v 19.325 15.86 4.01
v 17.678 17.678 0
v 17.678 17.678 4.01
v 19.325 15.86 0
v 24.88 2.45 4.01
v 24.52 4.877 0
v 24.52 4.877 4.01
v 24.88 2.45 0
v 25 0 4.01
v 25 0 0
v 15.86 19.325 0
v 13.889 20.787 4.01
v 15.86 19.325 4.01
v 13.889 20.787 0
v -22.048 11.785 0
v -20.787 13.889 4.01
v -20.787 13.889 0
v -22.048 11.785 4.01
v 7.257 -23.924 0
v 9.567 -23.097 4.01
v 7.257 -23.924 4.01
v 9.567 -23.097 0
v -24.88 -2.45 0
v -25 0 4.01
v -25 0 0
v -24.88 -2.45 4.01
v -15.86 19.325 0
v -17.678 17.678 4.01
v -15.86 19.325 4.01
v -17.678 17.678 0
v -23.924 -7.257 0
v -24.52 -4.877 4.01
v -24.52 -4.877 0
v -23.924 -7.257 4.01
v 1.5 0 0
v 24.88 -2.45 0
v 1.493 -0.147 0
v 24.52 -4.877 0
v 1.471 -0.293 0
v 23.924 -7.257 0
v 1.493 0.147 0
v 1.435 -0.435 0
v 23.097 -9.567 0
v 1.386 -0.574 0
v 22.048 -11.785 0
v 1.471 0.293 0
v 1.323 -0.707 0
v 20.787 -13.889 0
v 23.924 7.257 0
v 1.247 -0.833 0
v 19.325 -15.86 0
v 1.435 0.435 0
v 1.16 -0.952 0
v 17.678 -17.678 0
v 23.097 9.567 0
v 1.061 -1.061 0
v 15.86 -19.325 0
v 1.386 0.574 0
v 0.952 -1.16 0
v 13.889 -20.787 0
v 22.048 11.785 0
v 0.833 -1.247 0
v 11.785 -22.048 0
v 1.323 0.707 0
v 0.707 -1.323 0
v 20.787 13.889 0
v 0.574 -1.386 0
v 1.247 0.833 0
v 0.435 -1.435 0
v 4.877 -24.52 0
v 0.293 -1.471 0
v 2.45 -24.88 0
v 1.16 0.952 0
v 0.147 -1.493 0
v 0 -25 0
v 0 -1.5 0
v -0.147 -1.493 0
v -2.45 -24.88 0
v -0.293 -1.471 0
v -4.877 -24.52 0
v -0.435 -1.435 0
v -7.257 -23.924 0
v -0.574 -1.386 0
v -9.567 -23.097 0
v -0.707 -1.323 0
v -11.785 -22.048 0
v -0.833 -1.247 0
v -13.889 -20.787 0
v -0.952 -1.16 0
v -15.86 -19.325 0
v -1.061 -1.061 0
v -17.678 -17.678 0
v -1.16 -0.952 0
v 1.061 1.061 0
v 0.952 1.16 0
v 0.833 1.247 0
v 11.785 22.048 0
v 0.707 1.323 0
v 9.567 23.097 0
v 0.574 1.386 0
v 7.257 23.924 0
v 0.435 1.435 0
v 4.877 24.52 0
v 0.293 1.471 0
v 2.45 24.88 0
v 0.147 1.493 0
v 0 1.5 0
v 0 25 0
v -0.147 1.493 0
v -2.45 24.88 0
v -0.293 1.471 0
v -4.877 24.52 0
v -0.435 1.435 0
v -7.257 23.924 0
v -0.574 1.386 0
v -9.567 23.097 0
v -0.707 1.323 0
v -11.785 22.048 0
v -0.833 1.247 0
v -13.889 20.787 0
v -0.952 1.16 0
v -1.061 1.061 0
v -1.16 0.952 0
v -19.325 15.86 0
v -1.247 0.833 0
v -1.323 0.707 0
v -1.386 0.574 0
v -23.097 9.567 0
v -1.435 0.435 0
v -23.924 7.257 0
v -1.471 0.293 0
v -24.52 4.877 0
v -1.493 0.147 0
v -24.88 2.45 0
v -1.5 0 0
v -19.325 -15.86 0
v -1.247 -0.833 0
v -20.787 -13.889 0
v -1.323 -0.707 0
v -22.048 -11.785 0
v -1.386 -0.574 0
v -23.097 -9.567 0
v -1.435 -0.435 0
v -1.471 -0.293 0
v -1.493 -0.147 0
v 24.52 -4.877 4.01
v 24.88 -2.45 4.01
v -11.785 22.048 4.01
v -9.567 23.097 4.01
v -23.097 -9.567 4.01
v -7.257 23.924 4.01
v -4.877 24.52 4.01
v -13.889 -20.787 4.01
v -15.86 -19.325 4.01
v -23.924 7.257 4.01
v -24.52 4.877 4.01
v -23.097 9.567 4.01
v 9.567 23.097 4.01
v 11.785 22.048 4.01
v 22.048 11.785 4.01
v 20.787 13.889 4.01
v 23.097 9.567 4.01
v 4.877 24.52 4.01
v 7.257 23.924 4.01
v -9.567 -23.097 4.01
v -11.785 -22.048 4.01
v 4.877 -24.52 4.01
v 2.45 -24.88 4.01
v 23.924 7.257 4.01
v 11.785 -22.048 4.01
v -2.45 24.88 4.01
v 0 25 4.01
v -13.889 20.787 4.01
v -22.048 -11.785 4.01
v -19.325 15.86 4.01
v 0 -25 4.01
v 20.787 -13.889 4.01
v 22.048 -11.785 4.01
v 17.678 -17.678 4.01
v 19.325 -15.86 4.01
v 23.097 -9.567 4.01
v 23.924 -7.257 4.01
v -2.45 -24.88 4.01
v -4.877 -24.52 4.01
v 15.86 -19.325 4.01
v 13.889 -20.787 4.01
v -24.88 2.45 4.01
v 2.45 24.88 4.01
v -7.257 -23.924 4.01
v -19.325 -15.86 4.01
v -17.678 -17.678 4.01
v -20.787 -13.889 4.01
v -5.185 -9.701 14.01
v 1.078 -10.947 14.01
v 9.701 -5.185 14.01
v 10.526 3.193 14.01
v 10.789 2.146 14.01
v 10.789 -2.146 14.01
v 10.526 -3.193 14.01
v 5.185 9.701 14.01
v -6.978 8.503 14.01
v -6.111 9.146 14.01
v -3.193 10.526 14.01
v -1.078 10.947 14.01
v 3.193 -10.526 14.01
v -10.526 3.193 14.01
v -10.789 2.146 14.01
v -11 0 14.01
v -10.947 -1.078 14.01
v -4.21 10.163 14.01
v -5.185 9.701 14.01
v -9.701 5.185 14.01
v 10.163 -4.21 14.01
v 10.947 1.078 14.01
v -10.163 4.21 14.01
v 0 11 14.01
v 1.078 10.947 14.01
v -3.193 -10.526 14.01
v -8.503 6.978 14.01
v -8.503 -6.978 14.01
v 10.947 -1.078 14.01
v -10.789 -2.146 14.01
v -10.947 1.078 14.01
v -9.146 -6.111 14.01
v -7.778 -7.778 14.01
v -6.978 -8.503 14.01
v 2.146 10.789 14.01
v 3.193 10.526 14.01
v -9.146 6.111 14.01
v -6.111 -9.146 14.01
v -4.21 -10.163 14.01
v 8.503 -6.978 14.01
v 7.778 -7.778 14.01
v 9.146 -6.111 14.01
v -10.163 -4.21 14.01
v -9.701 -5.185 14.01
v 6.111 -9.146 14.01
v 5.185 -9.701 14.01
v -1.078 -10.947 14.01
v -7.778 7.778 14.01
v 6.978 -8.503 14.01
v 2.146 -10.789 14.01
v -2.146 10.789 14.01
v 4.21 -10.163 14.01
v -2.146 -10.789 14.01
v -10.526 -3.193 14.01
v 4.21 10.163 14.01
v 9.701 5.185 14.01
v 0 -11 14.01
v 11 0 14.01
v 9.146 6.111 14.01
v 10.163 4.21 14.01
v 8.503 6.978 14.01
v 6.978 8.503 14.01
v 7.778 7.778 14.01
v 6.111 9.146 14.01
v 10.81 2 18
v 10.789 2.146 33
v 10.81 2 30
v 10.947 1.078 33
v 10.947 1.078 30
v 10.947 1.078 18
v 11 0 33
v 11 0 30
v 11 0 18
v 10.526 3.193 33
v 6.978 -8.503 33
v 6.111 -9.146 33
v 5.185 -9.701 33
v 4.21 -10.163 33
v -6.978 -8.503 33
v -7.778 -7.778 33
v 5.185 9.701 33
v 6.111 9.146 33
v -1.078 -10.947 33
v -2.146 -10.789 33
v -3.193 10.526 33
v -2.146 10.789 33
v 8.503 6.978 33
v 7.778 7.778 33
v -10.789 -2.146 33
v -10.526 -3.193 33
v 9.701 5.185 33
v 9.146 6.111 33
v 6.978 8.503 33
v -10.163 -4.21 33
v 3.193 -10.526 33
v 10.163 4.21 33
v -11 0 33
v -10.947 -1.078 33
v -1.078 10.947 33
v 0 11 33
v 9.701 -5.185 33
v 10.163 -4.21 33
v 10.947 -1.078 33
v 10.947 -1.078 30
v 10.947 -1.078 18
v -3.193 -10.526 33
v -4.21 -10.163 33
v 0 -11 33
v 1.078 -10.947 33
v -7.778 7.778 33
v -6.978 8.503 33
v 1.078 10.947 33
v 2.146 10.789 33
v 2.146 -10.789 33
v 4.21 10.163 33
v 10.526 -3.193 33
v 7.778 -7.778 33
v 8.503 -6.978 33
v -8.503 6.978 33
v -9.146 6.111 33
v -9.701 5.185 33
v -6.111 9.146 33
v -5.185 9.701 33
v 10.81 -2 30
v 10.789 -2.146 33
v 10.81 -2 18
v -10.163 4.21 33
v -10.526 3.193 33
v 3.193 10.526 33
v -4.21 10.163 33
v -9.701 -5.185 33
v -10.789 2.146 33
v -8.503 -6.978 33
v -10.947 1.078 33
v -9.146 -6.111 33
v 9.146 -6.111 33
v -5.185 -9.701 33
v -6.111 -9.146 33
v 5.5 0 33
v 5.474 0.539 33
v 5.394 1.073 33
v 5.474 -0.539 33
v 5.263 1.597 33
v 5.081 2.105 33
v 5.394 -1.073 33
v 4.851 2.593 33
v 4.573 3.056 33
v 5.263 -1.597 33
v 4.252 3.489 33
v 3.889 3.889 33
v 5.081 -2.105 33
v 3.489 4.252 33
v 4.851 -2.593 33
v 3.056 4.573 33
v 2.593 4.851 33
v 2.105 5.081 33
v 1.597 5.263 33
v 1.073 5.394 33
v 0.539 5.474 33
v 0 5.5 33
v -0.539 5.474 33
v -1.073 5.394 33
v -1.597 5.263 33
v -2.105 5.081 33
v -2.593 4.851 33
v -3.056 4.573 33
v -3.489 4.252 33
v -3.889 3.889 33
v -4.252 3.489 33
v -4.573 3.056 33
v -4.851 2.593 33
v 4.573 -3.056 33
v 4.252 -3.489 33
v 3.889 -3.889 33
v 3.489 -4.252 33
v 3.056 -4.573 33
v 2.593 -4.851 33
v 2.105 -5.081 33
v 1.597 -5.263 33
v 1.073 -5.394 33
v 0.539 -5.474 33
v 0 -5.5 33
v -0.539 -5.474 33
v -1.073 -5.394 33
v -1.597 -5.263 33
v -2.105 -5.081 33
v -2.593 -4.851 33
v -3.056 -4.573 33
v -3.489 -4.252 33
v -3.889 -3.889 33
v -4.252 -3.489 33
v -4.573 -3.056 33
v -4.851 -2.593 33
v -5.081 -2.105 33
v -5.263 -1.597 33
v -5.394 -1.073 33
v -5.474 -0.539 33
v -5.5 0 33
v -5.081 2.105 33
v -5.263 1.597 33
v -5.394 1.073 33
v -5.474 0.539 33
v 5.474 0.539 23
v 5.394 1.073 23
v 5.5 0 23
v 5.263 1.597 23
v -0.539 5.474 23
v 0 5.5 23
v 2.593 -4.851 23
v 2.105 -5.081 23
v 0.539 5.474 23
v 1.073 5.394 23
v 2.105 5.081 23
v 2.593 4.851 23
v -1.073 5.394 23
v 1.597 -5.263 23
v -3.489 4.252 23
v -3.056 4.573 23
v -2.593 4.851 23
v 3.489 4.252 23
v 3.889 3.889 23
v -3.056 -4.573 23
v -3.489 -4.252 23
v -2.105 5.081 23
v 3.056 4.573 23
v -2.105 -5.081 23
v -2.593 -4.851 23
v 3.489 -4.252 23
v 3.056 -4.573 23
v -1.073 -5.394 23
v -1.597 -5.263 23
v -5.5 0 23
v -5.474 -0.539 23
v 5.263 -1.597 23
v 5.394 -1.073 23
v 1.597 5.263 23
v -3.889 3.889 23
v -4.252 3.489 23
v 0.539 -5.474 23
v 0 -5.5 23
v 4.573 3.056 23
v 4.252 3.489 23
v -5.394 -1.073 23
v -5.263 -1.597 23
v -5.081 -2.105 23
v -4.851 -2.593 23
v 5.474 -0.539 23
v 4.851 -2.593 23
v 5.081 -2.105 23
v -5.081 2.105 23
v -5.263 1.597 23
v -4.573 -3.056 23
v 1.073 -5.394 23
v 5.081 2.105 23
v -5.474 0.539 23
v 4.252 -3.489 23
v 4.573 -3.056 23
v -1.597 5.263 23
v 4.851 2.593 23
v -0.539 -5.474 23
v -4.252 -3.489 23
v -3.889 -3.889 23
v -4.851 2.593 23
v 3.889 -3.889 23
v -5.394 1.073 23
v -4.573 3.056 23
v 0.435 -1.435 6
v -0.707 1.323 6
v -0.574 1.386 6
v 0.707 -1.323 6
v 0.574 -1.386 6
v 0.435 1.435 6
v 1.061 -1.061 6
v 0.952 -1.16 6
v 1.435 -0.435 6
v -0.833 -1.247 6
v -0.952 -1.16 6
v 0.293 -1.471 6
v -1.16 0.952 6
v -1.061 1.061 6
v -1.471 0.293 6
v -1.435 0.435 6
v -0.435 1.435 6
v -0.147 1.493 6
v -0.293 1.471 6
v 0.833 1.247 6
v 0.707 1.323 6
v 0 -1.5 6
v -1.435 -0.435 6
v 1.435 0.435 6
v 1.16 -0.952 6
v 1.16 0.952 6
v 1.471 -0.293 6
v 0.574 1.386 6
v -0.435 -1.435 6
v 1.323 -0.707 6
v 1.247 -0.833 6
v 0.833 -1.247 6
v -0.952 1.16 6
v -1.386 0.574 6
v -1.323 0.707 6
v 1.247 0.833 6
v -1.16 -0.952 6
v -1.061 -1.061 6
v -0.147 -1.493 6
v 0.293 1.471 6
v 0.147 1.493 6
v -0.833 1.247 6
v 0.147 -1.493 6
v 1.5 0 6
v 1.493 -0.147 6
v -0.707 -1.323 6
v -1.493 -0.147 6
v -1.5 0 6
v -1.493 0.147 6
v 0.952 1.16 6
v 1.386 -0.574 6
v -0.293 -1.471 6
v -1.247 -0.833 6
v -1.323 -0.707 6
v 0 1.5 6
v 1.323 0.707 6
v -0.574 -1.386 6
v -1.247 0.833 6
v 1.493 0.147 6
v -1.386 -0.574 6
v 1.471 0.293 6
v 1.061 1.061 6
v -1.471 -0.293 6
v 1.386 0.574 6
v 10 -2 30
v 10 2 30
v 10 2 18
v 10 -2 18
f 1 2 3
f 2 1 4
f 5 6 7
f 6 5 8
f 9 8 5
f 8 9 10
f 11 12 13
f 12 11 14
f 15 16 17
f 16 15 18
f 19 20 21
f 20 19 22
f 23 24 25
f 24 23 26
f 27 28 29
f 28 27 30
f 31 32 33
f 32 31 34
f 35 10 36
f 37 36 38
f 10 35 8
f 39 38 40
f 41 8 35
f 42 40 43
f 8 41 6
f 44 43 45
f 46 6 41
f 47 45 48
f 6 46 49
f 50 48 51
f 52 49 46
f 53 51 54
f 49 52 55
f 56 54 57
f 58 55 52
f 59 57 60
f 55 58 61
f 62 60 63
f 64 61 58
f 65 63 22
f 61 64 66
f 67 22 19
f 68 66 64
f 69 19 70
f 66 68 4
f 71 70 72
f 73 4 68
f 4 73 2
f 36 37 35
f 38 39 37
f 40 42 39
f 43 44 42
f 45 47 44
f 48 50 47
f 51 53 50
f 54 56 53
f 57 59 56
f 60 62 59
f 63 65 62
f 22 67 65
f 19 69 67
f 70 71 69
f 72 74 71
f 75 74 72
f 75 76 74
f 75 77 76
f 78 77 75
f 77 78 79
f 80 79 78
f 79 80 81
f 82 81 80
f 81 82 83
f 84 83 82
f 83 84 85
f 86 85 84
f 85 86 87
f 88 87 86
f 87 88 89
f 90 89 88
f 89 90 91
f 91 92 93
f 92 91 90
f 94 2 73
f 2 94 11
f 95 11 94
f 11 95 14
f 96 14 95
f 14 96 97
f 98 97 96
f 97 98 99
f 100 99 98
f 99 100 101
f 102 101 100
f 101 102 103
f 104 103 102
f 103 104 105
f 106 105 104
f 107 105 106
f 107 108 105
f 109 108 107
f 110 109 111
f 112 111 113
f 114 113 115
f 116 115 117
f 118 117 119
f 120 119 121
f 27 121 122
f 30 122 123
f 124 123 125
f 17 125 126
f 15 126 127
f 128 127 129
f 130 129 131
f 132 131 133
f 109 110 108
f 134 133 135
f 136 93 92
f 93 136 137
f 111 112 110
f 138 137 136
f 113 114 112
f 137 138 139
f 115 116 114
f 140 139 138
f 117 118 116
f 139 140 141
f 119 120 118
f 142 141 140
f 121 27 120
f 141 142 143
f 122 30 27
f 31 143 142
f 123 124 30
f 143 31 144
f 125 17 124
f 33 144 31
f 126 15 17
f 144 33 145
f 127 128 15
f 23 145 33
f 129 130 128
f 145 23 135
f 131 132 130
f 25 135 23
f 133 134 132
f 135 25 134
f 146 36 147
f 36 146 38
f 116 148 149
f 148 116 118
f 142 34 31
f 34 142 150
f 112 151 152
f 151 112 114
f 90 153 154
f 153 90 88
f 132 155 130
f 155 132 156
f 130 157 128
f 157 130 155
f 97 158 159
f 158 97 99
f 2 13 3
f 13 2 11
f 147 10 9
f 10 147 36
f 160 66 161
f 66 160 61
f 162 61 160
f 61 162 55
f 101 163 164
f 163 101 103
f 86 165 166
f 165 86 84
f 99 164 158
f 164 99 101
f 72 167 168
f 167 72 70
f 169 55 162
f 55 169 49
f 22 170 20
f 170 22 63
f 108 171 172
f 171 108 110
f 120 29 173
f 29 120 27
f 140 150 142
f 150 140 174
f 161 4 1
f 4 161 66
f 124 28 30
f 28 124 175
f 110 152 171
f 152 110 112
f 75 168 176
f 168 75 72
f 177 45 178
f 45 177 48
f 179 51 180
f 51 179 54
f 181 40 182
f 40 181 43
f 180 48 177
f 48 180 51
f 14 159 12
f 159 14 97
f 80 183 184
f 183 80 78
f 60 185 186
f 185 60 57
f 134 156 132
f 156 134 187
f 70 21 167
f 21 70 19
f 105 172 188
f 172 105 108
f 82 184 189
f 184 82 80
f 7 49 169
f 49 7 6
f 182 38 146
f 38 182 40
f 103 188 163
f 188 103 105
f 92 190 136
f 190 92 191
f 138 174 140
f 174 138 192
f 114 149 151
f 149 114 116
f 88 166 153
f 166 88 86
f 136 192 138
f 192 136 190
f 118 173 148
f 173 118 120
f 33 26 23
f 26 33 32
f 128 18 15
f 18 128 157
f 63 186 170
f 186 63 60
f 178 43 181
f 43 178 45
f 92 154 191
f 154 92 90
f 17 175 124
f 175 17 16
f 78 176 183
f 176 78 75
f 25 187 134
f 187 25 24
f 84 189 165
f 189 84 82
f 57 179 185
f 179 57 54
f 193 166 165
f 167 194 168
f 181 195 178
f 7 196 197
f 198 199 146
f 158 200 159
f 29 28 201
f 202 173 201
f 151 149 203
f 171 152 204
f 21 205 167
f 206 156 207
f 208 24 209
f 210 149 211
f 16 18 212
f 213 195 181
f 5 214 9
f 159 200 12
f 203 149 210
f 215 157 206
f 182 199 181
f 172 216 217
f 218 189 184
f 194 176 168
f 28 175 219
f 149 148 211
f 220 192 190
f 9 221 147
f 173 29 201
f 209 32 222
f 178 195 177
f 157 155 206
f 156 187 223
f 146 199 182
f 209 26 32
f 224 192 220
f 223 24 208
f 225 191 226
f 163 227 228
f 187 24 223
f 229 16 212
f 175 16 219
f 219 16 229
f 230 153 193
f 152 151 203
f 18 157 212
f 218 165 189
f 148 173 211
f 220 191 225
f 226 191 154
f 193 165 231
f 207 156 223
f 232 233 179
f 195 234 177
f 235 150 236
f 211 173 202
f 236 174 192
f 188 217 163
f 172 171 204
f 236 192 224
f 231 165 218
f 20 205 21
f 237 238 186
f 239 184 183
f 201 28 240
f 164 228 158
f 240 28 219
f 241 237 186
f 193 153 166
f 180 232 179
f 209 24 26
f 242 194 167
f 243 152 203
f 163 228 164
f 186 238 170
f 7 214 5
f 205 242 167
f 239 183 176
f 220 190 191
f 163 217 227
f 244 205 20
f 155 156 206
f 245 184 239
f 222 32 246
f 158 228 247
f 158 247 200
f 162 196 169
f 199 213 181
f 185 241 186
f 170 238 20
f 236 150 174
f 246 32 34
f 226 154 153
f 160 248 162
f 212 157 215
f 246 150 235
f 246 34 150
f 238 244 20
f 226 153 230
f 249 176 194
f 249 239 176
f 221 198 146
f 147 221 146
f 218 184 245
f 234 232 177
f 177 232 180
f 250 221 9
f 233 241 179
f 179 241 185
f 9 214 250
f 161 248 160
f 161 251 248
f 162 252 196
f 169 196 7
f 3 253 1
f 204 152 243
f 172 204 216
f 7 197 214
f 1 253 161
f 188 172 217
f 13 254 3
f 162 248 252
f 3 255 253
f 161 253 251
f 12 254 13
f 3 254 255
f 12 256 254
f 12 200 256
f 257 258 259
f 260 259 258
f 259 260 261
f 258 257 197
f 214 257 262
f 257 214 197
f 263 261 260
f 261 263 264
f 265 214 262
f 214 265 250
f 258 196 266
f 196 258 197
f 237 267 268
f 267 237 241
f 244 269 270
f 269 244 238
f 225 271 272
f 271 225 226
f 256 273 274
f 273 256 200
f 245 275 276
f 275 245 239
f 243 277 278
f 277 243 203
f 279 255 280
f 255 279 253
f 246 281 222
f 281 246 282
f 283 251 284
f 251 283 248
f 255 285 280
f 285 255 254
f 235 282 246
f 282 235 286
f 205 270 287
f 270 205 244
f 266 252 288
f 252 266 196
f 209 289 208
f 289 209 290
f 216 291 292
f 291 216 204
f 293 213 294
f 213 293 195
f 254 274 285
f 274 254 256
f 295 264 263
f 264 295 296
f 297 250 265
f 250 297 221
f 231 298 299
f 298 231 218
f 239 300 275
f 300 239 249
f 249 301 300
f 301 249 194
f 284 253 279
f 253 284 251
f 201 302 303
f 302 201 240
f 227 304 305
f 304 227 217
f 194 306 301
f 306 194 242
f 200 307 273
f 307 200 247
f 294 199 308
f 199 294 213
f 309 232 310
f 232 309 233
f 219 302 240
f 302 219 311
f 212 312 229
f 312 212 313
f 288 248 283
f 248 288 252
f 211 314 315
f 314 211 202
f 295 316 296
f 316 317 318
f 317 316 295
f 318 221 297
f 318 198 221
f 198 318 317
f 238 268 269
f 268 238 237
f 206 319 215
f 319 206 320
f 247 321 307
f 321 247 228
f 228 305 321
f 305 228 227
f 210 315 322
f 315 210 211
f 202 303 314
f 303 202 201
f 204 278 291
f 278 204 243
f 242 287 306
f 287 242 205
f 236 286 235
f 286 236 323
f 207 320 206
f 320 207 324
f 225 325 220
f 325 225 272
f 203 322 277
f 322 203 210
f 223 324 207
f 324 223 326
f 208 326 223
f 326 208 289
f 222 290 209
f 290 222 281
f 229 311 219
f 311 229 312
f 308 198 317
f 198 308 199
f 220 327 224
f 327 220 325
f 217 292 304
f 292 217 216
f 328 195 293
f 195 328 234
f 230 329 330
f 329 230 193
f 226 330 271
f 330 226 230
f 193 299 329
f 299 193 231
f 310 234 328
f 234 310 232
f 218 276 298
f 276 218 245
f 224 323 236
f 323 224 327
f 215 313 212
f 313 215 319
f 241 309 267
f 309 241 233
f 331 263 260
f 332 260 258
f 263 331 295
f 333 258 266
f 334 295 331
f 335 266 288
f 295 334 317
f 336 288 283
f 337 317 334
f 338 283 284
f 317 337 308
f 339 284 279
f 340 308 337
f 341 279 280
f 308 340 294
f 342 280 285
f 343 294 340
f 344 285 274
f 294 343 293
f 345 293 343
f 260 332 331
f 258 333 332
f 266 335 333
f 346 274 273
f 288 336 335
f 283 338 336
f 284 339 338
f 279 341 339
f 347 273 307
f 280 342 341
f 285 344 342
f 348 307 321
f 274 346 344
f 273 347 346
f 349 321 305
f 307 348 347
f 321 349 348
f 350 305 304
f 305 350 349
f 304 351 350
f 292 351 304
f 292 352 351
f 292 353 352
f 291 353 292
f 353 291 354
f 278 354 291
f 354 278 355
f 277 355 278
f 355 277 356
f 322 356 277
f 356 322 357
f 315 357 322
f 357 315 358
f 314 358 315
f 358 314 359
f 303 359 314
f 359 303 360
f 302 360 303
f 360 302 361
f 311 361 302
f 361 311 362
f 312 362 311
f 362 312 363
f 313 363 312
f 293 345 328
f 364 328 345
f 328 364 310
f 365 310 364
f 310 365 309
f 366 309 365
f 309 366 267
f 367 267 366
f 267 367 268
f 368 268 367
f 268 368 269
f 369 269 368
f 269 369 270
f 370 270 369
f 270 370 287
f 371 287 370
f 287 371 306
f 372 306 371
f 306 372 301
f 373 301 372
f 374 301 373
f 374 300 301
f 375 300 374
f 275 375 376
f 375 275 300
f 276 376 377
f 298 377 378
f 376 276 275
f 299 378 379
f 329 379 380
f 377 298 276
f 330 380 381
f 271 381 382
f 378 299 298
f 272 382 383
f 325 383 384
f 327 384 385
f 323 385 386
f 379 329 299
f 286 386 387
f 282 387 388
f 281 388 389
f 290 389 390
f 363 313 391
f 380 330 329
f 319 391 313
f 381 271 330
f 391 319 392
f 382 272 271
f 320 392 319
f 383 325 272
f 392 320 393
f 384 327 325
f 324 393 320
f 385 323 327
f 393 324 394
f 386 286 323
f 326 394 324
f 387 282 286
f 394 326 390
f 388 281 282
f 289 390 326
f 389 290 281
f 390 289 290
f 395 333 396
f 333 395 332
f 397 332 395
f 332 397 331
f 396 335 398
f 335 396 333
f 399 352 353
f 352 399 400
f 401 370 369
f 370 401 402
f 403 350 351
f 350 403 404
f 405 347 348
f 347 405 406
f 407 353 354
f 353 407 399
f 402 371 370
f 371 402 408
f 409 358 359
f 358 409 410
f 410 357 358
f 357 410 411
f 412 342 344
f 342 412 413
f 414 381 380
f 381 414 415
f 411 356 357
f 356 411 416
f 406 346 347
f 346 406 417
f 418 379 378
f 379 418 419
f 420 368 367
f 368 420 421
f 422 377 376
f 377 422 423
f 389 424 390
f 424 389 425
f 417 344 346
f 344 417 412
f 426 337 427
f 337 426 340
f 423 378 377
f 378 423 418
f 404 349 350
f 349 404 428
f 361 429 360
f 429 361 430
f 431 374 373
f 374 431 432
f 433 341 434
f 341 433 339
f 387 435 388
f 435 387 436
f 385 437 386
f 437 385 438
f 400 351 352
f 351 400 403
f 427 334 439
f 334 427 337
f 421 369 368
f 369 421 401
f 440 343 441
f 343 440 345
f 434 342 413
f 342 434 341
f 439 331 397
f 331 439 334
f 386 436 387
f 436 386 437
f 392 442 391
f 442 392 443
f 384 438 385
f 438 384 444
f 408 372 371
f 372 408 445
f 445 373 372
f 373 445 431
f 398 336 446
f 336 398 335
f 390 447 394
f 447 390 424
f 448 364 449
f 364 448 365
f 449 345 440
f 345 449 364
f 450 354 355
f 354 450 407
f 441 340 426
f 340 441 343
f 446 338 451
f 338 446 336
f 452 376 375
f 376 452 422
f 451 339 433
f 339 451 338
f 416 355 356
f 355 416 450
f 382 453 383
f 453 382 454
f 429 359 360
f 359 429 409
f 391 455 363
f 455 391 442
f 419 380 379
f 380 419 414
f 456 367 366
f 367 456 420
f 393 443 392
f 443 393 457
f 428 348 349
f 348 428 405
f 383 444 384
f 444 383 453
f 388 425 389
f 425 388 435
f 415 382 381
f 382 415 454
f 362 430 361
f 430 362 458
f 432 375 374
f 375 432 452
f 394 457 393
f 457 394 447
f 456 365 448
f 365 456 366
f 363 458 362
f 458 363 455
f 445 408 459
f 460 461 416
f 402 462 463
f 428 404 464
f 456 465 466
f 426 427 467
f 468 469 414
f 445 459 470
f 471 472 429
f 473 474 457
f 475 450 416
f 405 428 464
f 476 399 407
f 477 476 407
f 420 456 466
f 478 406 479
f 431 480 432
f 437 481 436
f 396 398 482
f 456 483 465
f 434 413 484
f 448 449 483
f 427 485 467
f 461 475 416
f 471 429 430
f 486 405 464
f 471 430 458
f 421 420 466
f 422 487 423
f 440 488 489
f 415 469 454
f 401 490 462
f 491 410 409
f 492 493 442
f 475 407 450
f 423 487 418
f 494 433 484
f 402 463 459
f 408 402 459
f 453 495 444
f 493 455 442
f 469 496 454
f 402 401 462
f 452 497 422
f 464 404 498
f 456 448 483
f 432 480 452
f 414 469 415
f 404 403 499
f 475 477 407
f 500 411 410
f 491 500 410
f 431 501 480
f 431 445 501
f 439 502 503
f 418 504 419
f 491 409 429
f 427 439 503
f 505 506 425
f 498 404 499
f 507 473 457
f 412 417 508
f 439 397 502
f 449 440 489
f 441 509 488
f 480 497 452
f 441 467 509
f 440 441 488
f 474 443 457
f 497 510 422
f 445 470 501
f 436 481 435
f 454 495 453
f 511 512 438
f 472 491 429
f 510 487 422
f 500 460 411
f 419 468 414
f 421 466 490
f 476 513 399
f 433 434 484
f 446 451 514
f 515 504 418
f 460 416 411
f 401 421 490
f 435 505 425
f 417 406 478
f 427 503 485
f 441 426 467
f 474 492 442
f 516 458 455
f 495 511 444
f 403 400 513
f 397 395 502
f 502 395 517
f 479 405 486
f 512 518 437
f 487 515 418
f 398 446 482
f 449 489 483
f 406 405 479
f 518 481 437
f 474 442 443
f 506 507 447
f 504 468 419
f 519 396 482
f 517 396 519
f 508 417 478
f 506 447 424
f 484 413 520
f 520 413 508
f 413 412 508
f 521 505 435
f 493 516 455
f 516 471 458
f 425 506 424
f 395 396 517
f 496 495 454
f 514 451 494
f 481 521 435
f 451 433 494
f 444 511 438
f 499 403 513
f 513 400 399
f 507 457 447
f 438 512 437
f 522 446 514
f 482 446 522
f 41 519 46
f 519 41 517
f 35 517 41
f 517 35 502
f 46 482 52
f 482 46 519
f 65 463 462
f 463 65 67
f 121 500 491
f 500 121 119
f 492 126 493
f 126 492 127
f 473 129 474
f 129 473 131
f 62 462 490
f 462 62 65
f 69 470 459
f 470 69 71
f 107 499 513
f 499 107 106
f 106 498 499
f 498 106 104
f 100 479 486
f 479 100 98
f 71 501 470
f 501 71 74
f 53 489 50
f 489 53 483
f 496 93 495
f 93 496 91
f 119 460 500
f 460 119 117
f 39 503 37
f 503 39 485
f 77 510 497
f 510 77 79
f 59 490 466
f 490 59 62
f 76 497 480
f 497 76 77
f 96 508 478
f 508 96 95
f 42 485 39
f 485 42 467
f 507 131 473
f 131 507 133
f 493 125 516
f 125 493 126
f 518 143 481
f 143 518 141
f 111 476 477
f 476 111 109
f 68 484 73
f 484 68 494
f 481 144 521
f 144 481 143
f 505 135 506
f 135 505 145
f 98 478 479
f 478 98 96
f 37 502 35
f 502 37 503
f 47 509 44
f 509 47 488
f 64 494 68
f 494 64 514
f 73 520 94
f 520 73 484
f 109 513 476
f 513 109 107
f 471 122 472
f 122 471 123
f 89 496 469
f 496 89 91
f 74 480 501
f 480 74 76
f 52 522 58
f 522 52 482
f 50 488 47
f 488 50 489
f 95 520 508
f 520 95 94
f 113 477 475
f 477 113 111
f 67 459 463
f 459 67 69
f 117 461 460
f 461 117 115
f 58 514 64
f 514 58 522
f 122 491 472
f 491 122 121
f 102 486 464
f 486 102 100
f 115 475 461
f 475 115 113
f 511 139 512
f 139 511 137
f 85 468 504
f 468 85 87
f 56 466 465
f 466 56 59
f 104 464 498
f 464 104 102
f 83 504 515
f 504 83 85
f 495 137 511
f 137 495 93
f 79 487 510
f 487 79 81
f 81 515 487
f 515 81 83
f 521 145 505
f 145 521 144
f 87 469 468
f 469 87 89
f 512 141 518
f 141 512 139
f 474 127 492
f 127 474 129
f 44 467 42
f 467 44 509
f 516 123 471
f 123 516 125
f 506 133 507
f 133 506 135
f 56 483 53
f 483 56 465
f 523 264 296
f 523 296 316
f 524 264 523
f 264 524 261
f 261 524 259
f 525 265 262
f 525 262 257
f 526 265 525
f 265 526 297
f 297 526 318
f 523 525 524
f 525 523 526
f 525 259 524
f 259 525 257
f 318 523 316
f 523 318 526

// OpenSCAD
// --- Dimensions ---
base_diameter = 50;          // Diameter of the base disc
base_height = 4;            // Height of the base disc
cone_bottom_dia = 50;       // Diameter at the bottom of the cone (z=4)
cone_top_dia = 22;          // Diameter at the top of the cone (z=14)
cone_height = 10;           // Height of the cone section (14 - 4)
column_diameter = 22;       // Diameter of the upper column
column_height = 19;         // Height of the column (33 - 14)
total_height = 33;          // Total height of the stand

// Tube Seat Dimensions
seat_top_dia = 11;          // Diameter of the cylindrical seat
seat_top_z = 33;            // Z-coordinate at the top of the seat
seat_bottom_z = 23;         // Z-coordinate where seat becomes conical
seat_cone_bottom_dia = 3;   // Diameter at the tip of the internal cone
seat_cone_bottom_z = 6;     // Z-coordinate at the tip of the internal cone

// Viewing Window Dimensions
window_width_y = 4;         // Width of the window in Y direction
window_height_start = 18;   // Z-coordinate at bottom of window
window_height_end = 30;     // Z-coordinate at top of window
window_thickness_offset = 5; // Extra depth to ensure clean cut through walls

// --- Parameters ---
$fn = 64;

// --- Main Construction ---

difference() {
    // The Solid Body
    union() {
        // 1. Base Disc
        cylinder(d = base_diameter, h = base_height);

        // 2. Conical Section (z=4 to z=14)
        hull() {
            translate([0, 0, base_height])
                cylinder(d = cone_bottom_dia, h = 0.01);
            translate([0, 0, base_height + cone_height])
                cylinder(d = cone_top_dia, h = 0.01);
        }

        // 3. Upper Column (z=14 to z=33)
        translate([0, 0, base_height + cone_height])
            cylinder(d = column_diameter, h = column_height);
    }

    // --- Subtraction (Holes) ---

    // 1. The Tube Seat (Internal Cavity)
    // Note: The seat is a single continuous subtraction from top to bottom
    union() {
        // Cylindrical part of the seat (z=23 to z=33)
        translate([0, 0, seat_bottom_z])
            cylinder(d = seat_top_dia, h = seat_top_z - seat_bottom_z + 0.1);
        
        // Conical part of the seat (z=6 to z=23)
        hull() {
            translate([0, 0, seat_bottom_z])
                cylinder(d = seat_top_dia, h = 0.01);
            translate([0, 0, seat_cone_bottom_z])
                cylinder(d = seat_cone_bottom_dia, h = 0.01);
        }
        
        // Ensure the tip is fully cut through the bottom of the object
        translate([0, 0, 0])
            cylinder(d = seat_cone_bottom_dia, h = seat_cone_bottom_z + 0.1);
    }

    // 2. Viewing Window
    // Cut through the +X side.
    // The window is 4mm wide in Y, centered on Y=0.
    // It must cut from the seat (z=18) to the outside.
    // We use a large X translation to ensure it clears the entire radius.
    translate([column_diameter/2 - 1, -window_width_y/2, window_height_start])
        cube([window_thickness_offset + 2, window_width_y, window_height_end - window_height_start]);
}
